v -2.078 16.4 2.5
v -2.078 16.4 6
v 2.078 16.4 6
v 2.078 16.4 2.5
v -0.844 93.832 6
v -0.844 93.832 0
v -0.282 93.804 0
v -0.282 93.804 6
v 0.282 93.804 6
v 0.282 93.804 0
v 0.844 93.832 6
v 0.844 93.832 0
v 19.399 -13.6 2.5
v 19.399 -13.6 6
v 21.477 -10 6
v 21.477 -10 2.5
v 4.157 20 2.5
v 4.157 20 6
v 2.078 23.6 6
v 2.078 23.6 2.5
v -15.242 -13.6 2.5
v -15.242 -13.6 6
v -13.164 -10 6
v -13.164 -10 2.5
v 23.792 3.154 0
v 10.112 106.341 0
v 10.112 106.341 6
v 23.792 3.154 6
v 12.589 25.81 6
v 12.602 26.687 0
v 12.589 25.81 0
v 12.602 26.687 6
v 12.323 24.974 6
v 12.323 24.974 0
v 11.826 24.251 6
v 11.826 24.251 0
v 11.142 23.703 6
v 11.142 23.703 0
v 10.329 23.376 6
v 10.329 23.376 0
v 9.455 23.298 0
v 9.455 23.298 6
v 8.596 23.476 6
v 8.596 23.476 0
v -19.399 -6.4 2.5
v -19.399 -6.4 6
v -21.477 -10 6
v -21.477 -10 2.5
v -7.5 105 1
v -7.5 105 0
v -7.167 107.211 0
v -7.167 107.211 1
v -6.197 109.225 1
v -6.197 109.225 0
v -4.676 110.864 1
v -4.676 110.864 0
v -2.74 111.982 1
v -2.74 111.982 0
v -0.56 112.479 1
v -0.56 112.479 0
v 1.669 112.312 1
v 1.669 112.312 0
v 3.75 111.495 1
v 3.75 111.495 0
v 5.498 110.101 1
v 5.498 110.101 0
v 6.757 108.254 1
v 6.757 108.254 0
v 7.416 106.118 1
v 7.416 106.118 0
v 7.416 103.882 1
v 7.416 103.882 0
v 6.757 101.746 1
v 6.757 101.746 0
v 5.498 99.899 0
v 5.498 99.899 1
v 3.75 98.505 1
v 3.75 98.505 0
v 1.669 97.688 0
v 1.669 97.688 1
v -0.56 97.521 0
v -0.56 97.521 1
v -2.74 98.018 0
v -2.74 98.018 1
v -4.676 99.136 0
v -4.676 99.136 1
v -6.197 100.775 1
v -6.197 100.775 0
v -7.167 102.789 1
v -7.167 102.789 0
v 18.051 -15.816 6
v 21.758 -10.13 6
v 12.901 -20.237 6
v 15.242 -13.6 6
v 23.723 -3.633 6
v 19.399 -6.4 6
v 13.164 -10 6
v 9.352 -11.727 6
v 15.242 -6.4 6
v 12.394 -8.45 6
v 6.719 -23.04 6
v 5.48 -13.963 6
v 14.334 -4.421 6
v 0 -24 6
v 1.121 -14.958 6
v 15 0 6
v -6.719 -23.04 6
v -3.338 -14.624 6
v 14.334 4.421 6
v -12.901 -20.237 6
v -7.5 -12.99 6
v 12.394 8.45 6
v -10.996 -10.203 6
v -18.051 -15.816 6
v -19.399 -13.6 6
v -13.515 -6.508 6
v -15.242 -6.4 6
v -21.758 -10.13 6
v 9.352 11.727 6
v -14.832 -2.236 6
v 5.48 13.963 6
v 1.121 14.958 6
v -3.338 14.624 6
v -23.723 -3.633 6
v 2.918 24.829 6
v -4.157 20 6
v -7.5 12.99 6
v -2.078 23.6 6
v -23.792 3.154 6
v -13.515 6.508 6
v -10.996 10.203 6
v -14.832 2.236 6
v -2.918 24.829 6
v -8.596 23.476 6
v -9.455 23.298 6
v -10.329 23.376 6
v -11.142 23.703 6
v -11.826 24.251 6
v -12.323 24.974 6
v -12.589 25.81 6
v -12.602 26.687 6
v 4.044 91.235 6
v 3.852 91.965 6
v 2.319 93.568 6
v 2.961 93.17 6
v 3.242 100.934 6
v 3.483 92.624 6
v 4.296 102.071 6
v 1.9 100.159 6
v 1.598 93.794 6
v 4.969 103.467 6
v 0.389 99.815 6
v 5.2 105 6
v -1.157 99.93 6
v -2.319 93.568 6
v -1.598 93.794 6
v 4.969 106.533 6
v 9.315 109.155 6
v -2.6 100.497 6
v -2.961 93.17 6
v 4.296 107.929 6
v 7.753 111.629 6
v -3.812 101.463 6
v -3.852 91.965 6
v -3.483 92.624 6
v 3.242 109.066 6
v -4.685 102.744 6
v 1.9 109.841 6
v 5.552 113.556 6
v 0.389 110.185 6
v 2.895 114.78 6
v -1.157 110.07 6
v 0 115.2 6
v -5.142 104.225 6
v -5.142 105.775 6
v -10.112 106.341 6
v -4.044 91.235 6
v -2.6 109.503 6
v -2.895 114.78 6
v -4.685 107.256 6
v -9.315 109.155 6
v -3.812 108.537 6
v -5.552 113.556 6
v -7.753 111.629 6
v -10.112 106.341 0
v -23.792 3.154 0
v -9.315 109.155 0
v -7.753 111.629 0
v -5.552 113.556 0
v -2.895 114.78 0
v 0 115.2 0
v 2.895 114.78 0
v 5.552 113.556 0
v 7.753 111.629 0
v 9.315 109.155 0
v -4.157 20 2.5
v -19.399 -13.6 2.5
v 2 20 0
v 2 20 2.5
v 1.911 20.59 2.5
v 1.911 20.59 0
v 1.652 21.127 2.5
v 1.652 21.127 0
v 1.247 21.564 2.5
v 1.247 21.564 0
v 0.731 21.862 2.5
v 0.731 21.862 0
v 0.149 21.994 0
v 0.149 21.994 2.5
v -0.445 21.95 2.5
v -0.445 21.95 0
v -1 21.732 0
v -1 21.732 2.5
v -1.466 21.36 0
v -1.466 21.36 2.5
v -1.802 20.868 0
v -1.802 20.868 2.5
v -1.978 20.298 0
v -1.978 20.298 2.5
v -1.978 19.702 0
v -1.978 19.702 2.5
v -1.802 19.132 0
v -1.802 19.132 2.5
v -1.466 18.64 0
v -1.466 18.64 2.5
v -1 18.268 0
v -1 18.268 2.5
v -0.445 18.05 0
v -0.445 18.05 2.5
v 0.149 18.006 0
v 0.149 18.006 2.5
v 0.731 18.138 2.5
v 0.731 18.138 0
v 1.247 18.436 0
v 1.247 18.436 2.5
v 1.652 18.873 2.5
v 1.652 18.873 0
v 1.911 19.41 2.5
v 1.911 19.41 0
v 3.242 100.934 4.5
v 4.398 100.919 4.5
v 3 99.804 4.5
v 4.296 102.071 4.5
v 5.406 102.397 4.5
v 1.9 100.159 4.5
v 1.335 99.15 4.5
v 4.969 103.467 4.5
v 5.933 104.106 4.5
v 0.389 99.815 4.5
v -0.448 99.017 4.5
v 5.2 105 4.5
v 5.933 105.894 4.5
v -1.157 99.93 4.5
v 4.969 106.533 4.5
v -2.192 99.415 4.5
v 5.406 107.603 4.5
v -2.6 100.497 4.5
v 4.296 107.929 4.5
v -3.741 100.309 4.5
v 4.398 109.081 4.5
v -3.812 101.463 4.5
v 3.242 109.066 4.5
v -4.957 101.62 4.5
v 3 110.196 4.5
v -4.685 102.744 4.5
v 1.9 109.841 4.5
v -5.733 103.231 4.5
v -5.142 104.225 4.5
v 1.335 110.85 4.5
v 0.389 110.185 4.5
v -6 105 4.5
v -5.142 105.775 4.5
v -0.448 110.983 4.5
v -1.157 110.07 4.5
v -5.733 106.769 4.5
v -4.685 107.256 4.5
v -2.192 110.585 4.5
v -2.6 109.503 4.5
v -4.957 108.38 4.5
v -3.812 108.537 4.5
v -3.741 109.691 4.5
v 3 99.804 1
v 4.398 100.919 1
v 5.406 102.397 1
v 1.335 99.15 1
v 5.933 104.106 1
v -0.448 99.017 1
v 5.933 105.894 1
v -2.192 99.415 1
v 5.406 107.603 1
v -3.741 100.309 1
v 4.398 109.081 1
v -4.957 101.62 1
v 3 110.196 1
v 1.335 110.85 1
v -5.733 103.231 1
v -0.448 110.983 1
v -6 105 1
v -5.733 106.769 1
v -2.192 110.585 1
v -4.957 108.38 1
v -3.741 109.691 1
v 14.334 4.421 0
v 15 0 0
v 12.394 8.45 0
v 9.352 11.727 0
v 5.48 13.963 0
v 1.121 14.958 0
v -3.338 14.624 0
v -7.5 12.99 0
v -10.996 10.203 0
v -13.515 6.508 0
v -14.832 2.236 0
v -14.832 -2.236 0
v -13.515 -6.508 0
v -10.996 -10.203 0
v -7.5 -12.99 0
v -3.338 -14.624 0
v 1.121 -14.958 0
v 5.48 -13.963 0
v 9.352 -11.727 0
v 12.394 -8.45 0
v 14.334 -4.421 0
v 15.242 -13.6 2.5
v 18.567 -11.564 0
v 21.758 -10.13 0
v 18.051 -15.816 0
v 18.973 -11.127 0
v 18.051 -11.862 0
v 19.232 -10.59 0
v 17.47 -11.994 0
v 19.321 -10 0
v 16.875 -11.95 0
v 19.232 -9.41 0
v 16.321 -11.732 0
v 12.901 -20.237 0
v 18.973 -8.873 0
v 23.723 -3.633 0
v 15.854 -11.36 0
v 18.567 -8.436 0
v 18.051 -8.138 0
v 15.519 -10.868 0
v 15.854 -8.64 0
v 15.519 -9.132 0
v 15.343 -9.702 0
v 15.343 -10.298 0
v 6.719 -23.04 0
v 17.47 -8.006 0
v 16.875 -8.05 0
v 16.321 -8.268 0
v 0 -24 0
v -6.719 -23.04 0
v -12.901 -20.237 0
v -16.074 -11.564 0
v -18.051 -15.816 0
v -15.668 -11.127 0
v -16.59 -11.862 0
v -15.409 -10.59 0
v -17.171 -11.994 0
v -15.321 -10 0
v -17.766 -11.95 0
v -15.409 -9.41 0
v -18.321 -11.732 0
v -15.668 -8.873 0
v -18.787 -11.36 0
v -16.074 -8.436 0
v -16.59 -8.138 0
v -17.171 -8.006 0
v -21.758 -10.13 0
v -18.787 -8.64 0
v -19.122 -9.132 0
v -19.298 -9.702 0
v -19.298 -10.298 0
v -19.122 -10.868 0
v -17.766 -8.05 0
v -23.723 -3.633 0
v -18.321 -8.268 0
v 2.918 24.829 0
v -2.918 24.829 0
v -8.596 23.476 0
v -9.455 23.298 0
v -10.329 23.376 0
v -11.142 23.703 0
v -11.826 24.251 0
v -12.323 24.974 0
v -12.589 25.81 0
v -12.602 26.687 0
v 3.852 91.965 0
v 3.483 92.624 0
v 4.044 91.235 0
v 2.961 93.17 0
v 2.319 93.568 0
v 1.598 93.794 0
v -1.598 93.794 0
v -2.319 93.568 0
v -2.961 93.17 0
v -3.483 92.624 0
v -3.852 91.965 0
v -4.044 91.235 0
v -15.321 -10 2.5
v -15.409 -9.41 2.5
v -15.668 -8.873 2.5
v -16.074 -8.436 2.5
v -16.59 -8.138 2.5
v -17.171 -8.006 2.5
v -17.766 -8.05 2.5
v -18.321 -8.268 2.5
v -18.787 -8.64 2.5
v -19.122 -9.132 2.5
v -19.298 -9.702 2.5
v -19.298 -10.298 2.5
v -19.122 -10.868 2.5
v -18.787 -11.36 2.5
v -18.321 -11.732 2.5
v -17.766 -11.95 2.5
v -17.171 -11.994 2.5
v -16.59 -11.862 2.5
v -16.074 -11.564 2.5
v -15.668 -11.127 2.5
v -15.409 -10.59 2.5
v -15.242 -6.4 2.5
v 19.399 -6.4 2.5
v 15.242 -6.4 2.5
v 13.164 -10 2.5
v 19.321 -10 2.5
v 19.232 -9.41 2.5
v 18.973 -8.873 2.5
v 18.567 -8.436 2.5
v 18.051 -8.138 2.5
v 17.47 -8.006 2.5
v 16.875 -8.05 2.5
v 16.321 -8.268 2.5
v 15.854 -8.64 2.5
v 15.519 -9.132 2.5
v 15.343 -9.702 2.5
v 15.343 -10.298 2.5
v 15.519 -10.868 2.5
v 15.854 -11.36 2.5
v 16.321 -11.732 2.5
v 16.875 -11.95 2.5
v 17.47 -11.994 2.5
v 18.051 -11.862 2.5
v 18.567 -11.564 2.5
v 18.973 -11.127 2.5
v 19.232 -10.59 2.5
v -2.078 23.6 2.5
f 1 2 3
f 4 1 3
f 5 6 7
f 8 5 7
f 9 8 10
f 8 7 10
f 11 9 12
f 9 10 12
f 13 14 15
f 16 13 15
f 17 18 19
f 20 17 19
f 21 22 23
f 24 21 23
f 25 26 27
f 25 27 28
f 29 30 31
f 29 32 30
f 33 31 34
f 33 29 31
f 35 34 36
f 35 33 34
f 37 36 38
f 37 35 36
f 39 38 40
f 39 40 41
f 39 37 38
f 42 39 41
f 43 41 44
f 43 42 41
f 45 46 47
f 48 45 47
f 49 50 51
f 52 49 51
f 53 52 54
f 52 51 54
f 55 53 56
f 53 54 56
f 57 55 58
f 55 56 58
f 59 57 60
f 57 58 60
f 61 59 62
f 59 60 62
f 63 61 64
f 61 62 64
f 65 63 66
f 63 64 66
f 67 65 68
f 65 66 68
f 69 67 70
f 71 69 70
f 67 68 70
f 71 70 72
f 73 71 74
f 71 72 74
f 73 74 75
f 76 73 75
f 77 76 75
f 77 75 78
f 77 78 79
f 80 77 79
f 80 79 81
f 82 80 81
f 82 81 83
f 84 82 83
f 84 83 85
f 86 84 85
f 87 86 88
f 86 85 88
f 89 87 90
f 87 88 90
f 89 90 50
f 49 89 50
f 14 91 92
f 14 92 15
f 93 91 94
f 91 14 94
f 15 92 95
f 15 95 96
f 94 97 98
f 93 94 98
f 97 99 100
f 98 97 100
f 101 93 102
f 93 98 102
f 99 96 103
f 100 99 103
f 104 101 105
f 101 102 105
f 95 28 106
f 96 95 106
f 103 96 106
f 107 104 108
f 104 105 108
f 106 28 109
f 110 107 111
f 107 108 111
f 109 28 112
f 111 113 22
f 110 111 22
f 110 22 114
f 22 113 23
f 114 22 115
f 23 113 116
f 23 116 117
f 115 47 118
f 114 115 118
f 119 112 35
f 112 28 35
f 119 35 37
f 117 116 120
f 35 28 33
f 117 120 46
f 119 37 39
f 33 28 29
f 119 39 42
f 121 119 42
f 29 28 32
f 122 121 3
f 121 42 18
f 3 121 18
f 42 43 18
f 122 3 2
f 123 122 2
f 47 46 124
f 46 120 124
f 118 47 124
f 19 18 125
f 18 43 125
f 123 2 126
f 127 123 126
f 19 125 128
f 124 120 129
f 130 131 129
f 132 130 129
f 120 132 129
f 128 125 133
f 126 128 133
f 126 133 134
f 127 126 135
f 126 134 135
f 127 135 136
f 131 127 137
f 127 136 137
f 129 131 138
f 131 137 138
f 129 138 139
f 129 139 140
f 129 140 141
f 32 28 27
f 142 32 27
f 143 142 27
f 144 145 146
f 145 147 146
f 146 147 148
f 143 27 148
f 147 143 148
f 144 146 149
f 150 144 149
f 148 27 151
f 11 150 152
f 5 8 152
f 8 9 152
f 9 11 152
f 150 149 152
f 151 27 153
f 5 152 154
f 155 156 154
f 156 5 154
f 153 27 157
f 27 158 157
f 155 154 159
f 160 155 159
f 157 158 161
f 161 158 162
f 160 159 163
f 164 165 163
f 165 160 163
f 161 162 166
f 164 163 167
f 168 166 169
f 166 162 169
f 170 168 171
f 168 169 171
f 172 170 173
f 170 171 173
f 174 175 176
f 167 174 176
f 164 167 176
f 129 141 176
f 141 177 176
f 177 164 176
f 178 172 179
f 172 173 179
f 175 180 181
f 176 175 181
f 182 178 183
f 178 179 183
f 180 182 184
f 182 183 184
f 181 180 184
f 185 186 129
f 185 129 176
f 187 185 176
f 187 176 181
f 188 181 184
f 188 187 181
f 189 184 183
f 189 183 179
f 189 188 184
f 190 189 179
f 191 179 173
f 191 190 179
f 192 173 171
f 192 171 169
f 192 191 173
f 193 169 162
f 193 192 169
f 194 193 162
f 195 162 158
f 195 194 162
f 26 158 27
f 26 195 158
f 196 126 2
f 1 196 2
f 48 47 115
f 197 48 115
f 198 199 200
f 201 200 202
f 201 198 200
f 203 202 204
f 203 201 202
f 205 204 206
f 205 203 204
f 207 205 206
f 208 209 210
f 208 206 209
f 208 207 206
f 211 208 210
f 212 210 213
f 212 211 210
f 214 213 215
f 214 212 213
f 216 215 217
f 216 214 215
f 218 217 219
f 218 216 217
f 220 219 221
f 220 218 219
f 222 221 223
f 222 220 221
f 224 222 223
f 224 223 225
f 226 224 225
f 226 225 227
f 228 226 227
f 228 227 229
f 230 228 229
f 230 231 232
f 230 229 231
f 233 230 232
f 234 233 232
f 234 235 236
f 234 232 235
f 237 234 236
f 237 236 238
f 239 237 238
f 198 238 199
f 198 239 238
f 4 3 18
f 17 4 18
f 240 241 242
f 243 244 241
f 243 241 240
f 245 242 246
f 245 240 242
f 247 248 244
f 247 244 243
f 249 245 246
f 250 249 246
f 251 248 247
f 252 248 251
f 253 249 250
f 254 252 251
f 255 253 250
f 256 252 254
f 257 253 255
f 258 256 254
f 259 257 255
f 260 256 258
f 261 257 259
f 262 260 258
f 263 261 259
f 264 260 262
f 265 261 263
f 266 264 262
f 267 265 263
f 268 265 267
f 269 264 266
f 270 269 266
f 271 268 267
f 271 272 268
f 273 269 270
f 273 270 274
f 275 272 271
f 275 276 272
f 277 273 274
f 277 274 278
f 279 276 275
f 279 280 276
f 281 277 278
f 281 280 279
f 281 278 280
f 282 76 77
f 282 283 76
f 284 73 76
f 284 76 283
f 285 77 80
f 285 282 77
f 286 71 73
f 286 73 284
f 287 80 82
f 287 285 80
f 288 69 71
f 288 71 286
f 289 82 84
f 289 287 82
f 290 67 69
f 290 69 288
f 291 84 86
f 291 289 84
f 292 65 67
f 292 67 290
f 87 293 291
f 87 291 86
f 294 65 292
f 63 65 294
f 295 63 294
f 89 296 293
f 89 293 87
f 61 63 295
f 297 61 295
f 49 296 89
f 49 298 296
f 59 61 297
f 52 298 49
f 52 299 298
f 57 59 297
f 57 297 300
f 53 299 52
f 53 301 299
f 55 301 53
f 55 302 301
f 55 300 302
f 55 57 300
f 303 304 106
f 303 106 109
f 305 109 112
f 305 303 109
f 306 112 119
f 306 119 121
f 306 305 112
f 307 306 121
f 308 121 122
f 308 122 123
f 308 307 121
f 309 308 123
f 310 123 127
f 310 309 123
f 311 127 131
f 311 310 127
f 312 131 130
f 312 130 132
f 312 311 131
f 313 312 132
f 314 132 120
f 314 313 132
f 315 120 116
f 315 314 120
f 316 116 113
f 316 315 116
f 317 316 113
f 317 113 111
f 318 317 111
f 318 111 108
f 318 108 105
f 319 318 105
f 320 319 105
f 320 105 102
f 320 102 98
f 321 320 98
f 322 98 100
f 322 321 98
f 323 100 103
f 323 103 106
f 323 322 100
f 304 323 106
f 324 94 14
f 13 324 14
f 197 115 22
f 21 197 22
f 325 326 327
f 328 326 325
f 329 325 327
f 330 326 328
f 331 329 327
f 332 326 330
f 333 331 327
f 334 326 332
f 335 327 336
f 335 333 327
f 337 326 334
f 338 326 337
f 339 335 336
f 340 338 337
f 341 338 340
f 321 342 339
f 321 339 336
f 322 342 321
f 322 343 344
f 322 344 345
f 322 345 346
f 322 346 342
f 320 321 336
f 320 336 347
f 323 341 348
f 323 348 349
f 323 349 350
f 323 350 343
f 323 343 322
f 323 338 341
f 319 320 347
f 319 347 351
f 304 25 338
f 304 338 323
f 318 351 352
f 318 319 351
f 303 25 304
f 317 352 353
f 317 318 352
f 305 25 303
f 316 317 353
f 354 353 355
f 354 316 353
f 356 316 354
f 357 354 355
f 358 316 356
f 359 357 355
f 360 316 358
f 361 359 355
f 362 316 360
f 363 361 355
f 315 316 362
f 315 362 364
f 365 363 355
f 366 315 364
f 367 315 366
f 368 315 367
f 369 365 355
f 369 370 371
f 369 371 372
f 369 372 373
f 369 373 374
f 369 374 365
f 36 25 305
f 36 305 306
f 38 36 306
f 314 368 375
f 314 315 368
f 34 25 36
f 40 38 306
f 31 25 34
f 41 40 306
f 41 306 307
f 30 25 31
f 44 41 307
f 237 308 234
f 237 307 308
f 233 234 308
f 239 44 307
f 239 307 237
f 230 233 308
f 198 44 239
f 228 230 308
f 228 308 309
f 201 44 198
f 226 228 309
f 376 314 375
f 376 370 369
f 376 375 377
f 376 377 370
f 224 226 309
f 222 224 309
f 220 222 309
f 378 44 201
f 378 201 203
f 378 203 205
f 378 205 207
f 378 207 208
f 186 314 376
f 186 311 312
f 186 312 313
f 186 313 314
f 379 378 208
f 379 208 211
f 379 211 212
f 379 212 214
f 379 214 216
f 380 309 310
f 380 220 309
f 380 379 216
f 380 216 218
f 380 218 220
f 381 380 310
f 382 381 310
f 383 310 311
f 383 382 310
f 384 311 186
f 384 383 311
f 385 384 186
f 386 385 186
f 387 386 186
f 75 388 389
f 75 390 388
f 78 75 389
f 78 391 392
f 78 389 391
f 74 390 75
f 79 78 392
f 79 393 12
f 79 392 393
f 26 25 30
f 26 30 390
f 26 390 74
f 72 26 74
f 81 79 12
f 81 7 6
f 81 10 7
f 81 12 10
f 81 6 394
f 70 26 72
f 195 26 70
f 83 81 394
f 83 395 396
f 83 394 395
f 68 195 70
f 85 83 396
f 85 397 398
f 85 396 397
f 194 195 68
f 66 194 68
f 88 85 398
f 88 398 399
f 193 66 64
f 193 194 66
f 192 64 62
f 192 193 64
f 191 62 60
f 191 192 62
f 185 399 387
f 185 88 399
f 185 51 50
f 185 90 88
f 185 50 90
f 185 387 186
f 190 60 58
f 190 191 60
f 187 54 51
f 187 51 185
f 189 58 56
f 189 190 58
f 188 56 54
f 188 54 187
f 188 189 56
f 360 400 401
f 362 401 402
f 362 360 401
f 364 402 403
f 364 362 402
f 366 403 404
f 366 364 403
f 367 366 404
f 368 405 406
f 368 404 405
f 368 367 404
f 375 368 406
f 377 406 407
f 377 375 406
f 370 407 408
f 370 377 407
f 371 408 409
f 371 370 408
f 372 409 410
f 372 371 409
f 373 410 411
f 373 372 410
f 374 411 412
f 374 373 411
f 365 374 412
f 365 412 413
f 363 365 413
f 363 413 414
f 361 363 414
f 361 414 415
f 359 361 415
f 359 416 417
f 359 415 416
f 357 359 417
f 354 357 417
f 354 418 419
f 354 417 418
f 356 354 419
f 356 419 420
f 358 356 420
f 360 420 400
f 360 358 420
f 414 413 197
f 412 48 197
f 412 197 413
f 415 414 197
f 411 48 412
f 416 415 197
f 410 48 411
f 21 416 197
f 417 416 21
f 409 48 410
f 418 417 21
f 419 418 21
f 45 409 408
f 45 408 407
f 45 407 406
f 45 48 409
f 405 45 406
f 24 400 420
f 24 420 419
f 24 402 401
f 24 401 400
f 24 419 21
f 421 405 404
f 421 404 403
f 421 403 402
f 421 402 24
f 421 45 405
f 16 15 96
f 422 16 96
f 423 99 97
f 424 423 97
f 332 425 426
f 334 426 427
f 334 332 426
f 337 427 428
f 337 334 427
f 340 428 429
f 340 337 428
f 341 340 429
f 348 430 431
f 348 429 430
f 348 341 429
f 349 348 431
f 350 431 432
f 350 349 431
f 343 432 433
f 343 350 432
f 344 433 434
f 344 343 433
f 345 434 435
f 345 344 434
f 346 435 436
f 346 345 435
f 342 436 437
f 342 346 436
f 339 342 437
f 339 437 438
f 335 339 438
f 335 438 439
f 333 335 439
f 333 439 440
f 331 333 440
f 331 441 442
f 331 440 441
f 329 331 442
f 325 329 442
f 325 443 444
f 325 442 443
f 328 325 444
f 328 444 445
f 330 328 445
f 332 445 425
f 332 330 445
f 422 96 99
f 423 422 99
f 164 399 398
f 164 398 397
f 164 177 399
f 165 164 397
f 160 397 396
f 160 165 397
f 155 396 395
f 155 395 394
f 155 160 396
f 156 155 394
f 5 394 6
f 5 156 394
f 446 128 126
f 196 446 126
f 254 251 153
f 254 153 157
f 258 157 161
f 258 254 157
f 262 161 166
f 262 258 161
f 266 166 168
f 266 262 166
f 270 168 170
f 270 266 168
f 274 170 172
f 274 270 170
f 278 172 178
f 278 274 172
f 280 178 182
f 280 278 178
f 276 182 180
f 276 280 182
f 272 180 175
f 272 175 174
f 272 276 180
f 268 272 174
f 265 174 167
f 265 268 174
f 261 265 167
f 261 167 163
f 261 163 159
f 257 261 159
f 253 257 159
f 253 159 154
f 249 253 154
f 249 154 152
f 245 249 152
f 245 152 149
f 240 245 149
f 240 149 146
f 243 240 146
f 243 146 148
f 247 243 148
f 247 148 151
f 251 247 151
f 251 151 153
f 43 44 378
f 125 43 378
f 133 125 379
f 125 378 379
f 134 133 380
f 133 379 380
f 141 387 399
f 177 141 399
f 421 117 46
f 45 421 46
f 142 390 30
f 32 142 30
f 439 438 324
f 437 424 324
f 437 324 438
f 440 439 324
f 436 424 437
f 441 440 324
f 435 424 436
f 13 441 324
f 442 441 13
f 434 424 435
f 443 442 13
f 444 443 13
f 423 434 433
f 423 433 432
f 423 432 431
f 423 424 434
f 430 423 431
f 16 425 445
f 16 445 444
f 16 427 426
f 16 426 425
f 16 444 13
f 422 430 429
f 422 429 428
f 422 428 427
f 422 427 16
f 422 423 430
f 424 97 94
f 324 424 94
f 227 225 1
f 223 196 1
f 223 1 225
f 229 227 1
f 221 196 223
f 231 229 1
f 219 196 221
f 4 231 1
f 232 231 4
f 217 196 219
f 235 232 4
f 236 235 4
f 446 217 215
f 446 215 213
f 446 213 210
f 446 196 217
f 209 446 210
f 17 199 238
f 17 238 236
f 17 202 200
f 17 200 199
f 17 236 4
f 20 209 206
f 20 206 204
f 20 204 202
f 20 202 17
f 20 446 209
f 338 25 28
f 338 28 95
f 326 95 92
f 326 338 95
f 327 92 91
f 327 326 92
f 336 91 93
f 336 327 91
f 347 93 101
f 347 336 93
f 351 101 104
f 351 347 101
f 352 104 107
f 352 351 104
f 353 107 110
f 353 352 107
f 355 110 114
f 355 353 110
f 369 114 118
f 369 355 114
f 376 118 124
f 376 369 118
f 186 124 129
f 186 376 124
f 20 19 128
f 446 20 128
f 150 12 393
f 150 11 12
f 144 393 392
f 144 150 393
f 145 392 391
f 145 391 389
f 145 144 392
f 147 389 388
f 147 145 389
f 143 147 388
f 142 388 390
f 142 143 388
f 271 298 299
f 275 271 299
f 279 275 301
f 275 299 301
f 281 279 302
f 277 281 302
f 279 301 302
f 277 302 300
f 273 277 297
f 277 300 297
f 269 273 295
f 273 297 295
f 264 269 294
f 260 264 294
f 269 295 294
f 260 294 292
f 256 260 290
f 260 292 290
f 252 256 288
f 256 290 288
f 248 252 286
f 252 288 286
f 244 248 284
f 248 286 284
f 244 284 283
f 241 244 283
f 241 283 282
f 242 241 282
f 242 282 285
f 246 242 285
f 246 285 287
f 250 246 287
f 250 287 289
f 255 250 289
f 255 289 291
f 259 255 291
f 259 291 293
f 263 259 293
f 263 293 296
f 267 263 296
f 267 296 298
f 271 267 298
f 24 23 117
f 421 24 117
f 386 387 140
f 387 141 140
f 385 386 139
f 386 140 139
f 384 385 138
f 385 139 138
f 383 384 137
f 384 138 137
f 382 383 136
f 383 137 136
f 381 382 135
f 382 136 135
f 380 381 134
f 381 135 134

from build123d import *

# Parameters (mm, degrees)
SKETCH_1_R          = 15
SKETCH_1_R_2        = 2
SKETCH_1_R_3        = 5.2
EXTRUDE_1_DEPTH     = 6
FILLET_1_R          = 3
CUT_EXTRUDE_1_DEPTH = 3.5
SKETCH_3_R          = 6
CUT_EXTRUDE_2_DEPTH = 4.5
SKETCH_4_R          = 7.5
CUT_EXTRUDE_3_DEPTH = 1


with BuildPart() as part:
    # 草图1 → 凸台-拉伸1 (new body)
    with BuildSketch(Plane.XY):
        with BuildLine():
            Line((-23.791815434, 3.154285714), (-10.111521559, 106.340571429))
            ThreePointArc((-10.111521559, 106.340571429), (0, 115.2), (10.111521559, 106.340571429))
            Line((10.111521559, 106.340571429), (23.791815434, 3.154285714))
            ThreePointArc((23.791815434, 3.154285714), (0, -24), (-23.791815434, 3.154285714))
        make_face()
        Circle(SKETCH_1_R, mode=Mode.SUBTRACT)
        with Locations((0, 20)):
            Circle(SKETCH_1_R_2, mode=Mode.SUBTRACT)
        with Locations((0, 105)):
            Circle(SKETCH_1_R_3, mode=Mode.SUBTRACT)
        with Locations((17.320508076, -10)):
            Circle(SKETCH_1_R_2, mode=Mode.SUBTRACT)
        with Locations((-17.320508076, -10)):
            Circle(SKETCH_1_R_2, mode=Mode.SUBTRACT)
        with BuildLine():
            Line((-13.336549876, 21.1456009), (-3.624239112, 94.402599807))
            ThreePointArc((-3.624239112, 94.402599807), (0, 93.8), (3.624239112, 94.402599807))
            Line((3.624239112, 94.402599807), (13.336549876, 21.1456009))
            ThreePointArc((13.336549876, 21.1456009), (0, 25), (-13.336549876, 21.1456009))
        make_face(mode=Mode.SUBTRACT)
    extrude(amount=EXTRUDE_1_DEPTH)

    # 圆角1
    fillet_1_edges = [part.edges().sort_by_distance(p)[0] for p in [
        (-13.336549876, 21.1456009, 3),
        (13.336549876, 21.1456009, 3),
        (3.624239112, 94.402599807, 3),
        (-3.624239112, 94.402599807, 3),
    ]]
    fillet(fillet_1_edges, radius=FILLET_1_R)

    # 草图2 → 切除-拉伸1 (cut)
    with BuildSketch(Plane.XY.offset(6)):
        Polygon((2.078460969, 16.4), (4.156921938, 20), (2.078460969, 23.6), (-2.078460969, 23.6), (-4.156921938, 20), (-2.078460969, 16.4), align=None)
        Polygon((19.398969045, -13.6), (21.477430014, -10), (19.398969045, -6.4), (15.242047107, -6.4), (13.163586138, -10), (15.242047107, -13.6), align=None)
        Polygon((-15.242047107, -13.6), (-13.163586138, -10), (-15.242047107, -6.4), (-19.398969045, -6.4), (-21.477430014, -10), (-19.398969045, -13.6), align=None)
    extrude(amount=-CUT_EXTRUDE_1_DEPTH, mode=Mode.SUBTRACT)

    # 草图3 → 切除-拉伸2 (cut)
    with BuildSketch(Plane(origin=(0, 0, 0), x_dir=(-1, 0, 0), z_dir=(0, 0, -1))):
        with Locations((0, 105)):
            Circle(SKETCH_3_R)
    extrude(amount=-CUT_EXTRUDE_2_DEPTH, mode=Mode.SUBTRACT)

    # 草图4 → 切除-拉伸3 (cut)
    with BuildSketch(Plane(origin=(0, 0, 0), x_dir=(-1, 0, 0), z_dir=(0, 0, -1))):
        with Locations((0, 105)):
            Circle(SKETCH_4_R)
    extrude(amount=-CUT_EXTRUDE_3_DEPTH, mode=Mode.SUBTRACT)


solid = part.part
